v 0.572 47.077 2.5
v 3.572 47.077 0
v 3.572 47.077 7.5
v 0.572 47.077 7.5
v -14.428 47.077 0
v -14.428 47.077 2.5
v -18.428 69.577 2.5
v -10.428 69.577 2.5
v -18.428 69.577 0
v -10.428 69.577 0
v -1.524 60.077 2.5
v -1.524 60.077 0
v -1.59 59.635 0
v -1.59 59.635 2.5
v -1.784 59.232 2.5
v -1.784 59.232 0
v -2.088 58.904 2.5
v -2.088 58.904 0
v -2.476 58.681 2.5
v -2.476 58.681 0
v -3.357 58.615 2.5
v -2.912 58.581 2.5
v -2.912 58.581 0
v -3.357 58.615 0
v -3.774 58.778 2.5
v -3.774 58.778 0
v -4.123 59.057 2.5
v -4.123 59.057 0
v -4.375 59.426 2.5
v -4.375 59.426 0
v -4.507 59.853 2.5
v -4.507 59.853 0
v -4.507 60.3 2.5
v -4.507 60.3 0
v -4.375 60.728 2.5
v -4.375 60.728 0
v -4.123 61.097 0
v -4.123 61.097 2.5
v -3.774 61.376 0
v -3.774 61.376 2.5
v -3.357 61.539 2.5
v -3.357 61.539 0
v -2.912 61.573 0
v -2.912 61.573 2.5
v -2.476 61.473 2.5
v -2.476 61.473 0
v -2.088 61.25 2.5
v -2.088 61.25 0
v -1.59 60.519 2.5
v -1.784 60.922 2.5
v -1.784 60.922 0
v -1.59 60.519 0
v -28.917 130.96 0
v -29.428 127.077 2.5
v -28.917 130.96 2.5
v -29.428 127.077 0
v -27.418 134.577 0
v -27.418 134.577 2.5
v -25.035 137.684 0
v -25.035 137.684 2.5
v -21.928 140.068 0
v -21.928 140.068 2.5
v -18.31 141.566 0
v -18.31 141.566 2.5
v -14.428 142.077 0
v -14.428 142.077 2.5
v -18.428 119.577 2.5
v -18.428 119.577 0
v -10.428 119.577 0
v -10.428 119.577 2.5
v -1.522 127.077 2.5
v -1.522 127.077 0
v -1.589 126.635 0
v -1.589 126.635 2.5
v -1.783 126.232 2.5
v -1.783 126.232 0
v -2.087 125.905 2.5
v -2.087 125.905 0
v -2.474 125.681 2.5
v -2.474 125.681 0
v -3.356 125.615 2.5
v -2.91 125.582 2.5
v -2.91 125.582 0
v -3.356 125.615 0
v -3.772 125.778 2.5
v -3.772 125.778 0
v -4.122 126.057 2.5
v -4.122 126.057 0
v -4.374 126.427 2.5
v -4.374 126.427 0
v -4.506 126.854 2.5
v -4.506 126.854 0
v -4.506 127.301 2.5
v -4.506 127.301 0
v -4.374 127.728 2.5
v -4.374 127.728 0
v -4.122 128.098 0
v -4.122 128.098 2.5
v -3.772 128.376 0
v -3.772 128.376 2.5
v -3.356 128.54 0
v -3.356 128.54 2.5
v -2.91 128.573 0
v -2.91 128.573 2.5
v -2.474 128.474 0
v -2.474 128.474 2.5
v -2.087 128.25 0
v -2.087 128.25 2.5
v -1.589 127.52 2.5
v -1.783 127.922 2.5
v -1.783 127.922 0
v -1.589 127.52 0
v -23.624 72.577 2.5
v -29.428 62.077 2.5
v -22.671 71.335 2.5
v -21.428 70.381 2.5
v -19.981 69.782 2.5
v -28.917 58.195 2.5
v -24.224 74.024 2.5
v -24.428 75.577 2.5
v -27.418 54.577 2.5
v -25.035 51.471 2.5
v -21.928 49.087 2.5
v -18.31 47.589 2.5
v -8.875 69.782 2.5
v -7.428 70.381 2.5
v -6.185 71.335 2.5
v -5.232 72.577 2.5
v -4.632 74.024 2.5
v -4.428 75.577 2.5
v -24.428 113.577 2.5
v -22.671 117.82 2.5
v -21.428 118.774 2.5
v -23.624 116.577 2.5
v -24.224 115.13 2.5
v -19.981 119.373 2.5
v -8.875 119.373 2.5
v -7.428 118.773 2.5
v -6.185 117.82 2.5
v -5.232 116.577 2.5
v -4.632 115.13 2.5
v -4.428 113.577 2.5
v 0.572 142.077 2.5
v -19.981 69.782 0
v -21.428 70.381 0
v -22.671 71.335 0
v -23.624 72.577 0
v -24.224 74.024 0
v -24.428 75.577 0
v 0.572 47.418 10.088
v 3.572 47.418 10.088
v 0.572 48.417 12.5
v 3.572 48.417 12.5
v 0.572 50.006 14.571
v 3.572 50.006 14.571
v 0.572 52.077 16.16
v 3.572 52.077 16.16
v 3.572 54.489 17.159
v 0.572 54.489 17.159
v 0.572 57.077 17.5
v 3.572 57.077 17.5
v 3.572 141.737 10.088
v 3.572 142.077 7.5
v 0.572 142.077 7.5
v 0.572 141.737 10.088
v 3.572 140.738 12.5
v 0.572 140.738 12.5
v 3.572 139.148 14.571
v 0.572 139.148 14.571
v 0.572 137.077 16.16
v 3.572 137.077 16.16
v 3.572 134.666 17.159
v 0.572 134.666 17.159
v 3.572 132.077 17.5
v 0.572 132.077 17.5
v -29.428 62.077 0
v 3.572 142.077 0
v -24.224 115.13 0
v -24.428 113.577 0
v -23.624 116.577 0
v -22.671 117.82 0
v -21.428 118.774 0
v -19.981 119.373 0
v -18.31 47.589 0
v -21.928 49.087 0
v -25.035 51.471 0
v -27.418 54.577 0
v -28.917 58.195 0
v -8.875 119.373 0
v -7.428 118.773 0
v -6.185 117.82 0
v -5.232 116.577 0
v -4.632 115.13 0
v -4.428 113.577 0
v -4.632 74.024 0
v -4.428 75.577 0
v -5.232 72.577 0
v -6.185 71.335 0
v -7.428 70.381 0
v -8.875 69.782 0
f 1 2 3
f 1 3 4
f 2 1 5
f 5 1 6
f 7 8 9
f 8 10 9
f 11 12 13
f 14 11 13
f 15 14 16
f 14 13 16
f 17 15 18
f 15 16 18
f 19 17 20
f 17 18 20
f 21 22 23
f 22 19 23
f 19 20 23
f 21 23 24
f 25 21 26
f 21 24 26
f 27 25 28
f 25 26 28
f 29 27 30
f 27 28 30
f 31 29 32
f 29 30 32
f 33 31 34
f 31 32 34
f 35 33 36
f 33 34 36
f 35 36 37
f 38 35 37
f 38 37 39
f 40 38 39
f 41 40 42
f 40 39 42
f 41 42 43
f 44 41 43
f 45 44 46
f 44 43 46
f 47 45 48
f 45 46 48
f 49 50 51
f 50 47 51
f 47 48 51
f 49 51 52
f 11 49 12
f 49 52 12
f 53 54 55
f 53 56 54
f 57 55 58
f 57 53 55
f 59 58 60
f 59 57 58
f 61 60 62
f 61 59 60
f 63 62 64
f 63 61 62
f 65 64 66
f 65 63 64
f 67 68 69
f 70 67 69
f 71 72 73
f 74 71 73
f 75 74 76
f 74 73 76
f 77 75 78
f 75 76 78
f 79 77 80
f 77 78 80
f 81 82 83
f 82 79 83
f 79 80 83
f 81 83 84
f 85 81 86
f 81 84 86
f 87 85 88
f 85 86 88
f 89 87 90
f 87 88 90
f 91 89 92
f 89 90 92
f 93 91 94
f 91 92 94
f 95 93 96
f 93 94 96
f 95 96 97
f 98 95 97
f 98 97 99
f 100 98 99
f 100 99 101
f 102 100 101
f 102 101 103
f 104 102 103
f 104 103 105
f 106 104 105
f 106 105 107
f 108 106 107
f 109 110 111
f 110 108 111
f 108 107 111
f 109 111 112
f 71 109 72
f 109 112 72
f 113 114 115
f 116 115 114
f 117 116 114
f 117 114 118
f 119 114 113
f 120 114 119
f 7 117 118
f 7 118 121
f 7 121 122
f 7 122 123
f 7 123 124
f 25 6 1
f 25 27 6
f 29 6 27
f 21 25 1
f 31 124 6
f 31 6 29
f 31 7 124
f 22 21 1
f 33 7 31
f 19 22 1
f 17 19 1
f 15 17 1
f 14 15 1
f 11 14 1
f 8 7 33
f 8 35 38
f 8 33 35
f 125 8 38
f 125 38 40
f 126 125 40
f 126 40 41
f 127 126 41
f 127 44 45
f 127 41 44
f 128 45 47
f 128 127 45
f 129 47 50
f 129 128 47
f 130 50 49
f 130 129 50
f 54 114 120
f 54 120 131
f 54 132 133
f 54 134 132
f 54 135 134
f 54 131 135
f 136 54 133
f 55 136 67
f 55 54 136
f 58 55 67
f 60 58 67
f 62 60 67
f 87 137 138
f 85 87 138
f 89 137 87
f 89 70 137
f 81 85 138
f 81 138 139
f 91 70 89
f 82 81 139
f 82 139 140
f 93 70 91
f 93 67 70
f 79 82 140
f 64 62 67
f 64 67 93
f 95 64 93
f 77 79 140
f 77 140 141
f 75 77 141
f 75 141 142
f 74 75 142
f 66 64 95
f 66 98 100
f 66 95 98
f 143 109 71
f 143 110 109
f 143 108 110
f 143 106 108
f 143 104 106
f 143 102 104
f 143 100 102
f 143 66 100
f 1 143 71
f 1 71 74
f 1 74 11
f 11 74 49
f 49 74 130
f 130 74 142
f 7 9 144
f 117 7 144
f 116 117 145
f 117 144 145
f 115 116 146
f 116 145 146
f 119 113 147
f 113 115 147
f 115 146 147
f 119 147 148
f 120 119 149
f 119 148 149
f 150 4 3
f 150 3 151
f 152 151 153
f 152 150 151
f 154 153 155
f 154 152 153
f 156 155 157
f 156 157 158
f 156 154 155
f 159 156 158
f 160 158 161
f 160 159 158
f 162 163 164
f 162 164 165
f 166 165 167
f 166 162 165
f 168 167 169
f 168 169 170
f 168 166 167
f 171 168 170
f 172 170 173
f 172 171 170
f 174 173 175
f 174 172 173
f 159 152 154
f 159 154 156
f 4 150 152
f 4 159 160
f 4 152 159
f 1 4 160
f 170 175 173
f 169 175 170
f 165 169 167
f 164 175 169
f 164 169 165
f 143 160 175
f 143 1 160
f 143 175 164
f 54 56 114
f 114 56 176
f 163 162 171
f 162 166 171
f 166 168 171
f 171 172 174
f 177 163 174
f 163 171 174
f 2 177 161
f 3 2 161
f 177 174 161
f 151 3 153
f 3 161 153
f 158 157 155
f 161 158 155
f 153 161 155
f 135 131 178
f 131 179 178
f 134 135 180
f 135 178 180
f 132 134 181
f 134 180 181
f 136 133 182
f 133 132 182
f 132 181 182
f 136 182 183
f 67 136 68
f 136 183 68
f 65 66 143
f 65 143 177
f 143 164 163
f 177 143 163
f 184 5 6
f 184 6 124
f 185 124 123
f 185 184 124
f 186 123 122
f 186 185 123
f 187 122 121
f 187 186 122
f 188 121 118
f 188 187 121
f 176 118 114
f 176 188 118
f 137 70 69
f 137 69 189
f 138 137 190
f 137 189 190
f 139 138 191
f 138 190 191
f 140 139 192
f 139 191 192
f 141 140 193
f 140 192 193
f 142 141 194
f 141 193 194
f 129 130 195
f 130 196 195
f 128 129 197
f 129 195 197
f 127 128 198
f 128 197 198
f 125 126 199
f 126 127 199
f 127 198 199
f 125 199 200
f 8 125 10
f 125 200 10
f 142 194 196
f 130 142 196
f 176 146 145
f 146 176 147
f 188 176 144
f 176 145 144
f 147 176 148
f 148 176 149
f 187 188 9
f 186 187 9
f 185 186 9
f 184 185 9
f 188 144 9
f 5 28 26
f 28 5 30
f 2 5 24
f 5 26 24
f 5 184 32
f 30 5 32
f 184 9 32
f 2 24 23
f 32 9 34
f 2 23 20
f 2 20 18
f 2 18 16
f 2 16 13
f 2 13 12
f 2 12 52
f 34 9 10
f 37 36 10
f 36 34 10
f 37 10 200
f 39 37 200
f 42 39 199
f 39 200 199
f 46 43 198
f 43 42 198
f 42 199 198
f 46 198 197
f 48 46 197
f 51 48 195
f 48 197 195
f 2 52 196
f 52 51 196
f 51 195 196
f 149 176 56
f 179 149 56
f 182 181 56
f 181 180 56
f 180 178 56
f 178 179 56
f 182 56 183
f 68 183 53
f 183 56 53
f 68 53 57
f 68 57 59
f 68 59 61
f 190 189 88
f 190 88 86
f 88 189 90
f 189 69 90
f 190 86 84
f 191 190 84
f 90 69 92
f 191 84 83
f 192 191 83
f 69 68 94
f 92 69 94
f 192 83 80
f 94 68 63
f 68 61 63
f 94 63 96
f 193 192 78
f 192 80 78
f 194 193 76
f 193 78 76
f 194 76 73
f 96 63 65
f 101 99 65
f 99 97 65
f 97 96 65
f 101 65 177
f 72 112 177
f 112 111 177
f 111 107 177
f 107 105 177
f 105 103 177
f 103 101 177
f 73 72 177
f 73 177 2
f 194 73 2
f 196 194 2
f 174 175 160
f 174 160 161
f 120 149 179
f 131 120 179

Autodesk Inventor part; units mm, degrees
ref_plane "YZ Plane" through (0, 0, 0) normal (1, 0, 0) x (0, 1, 0)
ref_plane "XZ Plane" through (0, 0, 0) normal (0, 1, 0) x (-1, 0, 0)
ref_plane "XY Plane" through (0, 0, 0) normal (0, 0, 1) x (1, 0, 0)
sketch "Sketch1" plane through (0, 0, 0) normal (0, 0, 1) x (1, 0, 0)
  circle A0 centre (-3.0223, 127.0774) radius 1.5 projected
  circle A1 centre (-3.0236, 60.0769) radius 1.5 projected
  circle A2 centre (-3.0223, 127.0774) radius 1.5
  circle A3 centre (-3.0236, 60.0769) radius 1.5
  line L0 (3.5721, 158.6605) -> (3.572, -21.7605) projected
  line L1 (0.5721, 162.401) -> (0.572, -18.02)
  line L2 (0.572, 142.0774) -> (-14.428, 142.0774)
  line L3 (-29.428, 127.0774) -> (-29.428, 62.0774)
  line L4 (-14.428, 47.0774) -> (0.572, 47.0774)
  line L5 (0.572, 47.0774) -> (0.572, 142.0774)
  arc A4 (-14.428, 142.0774) -> (-29.428, 127.0774) centre (-14.428, 127.0774) ccw
  arc A5 (-29.428, 62.0774) -> (-14.428, 47.0774) centre (-14.428, 62.0774) ccw
  line L6 (-18.428, 119.5774) -> (-10.4279, 119.5774)
  line L7 (-4.428, 113.5774) -> (-4.428, 75.5774)
  line L8 (-10.428, 69.5774) -> (-18.428, 69.5774)
  line L9 (-24.428, 75.5774) -> (-24.428, 113.5774)
  arc A6 (-18.428, 119.5774) -> (-24.428, 113.5774) centre (-18.428, 113.5774) ccw
  arc A7 (-4.428, 113.5774) -> (-10.4279, 119.5774) centre (-10.4279, 113.5774) ccw
  arc A8 (-24.428, 75.5774) -> (-18.428, 69.5774) centre (-18.428, 75.5774) ccw
  arc A9 (-10.428, 69.5774) -> (-4.428, 75.5774) centre (-10.428, 75.5774) ccw
  line L10 (0.572, 142.0774) -> (3.572, 142.0774)
  line L11 (3.572, 142.0774) -> (3.572, 47.0774)
  line L12 (3.572, 47.0774) -> (0.572, 47.0774)
  line L13 (0.572, 47.0774) -> (0.572, 142.0774)
  point P0 (0, 0)
  point P1 (-29.428, 47.0774)
  point P2 (-29.428, 142.0774)
  point P3 (-24.428, 119.5774)
  point P4 (-4.428, 119.5774)
  point P5 (-24.428, 69.5774)
  point P6 (-24.428, 94.5774)
  point P7 (-29.428, 94.5774)
  point P8 (-14.428, 119.5774)
  point P9 (0.572, 47.0774)
  dimension "d0" = 3
  dimension "d1" = 30
  dimension "d2" = 95
  dimension "d3" = 15
  dimension "d4" = 15
  dimension "d7" = 50
  dimension "d8" = 20
  dimension "d9" = 6
  dimension "d10" = 95
extrude "Extrusion1" add sketch "Sketch1" along normal blind 2.5 contours L1 L4 A5 L3 A4 L2
sketch "Sketch2" plane through (0, 0, 2.5) normal (0, 0, 1) x (1, 0, 0)
  line L0 (0.572, 47.0774) -> (0.572, 142.0774) projected
  line L1 (0.572, 142.0774) -> (3.572, 142.0774)
  line L2 (3.572, 142.0774) -> (3.572, 47.0774)
  line L3 (3.572, 47.0774) -> (0.572, 47.0774)
  line L4 (0.572, 47.0774) -> (0.572, 142.0774)
  point P0 (0, 0)
  dimension "d13" = 3
extrude "Extrusion2" add sketch "Sketch2" along normal blind 15
fillet "Fillet1" radius 10 2 edges at (2.072, 47.0774, 17.5) (2.072, 142.0774, 17.5)
extrude "Extrusion3" add sketch "Sketch2" against normal blind 2.5
properties part number "screen_back_support_right"
